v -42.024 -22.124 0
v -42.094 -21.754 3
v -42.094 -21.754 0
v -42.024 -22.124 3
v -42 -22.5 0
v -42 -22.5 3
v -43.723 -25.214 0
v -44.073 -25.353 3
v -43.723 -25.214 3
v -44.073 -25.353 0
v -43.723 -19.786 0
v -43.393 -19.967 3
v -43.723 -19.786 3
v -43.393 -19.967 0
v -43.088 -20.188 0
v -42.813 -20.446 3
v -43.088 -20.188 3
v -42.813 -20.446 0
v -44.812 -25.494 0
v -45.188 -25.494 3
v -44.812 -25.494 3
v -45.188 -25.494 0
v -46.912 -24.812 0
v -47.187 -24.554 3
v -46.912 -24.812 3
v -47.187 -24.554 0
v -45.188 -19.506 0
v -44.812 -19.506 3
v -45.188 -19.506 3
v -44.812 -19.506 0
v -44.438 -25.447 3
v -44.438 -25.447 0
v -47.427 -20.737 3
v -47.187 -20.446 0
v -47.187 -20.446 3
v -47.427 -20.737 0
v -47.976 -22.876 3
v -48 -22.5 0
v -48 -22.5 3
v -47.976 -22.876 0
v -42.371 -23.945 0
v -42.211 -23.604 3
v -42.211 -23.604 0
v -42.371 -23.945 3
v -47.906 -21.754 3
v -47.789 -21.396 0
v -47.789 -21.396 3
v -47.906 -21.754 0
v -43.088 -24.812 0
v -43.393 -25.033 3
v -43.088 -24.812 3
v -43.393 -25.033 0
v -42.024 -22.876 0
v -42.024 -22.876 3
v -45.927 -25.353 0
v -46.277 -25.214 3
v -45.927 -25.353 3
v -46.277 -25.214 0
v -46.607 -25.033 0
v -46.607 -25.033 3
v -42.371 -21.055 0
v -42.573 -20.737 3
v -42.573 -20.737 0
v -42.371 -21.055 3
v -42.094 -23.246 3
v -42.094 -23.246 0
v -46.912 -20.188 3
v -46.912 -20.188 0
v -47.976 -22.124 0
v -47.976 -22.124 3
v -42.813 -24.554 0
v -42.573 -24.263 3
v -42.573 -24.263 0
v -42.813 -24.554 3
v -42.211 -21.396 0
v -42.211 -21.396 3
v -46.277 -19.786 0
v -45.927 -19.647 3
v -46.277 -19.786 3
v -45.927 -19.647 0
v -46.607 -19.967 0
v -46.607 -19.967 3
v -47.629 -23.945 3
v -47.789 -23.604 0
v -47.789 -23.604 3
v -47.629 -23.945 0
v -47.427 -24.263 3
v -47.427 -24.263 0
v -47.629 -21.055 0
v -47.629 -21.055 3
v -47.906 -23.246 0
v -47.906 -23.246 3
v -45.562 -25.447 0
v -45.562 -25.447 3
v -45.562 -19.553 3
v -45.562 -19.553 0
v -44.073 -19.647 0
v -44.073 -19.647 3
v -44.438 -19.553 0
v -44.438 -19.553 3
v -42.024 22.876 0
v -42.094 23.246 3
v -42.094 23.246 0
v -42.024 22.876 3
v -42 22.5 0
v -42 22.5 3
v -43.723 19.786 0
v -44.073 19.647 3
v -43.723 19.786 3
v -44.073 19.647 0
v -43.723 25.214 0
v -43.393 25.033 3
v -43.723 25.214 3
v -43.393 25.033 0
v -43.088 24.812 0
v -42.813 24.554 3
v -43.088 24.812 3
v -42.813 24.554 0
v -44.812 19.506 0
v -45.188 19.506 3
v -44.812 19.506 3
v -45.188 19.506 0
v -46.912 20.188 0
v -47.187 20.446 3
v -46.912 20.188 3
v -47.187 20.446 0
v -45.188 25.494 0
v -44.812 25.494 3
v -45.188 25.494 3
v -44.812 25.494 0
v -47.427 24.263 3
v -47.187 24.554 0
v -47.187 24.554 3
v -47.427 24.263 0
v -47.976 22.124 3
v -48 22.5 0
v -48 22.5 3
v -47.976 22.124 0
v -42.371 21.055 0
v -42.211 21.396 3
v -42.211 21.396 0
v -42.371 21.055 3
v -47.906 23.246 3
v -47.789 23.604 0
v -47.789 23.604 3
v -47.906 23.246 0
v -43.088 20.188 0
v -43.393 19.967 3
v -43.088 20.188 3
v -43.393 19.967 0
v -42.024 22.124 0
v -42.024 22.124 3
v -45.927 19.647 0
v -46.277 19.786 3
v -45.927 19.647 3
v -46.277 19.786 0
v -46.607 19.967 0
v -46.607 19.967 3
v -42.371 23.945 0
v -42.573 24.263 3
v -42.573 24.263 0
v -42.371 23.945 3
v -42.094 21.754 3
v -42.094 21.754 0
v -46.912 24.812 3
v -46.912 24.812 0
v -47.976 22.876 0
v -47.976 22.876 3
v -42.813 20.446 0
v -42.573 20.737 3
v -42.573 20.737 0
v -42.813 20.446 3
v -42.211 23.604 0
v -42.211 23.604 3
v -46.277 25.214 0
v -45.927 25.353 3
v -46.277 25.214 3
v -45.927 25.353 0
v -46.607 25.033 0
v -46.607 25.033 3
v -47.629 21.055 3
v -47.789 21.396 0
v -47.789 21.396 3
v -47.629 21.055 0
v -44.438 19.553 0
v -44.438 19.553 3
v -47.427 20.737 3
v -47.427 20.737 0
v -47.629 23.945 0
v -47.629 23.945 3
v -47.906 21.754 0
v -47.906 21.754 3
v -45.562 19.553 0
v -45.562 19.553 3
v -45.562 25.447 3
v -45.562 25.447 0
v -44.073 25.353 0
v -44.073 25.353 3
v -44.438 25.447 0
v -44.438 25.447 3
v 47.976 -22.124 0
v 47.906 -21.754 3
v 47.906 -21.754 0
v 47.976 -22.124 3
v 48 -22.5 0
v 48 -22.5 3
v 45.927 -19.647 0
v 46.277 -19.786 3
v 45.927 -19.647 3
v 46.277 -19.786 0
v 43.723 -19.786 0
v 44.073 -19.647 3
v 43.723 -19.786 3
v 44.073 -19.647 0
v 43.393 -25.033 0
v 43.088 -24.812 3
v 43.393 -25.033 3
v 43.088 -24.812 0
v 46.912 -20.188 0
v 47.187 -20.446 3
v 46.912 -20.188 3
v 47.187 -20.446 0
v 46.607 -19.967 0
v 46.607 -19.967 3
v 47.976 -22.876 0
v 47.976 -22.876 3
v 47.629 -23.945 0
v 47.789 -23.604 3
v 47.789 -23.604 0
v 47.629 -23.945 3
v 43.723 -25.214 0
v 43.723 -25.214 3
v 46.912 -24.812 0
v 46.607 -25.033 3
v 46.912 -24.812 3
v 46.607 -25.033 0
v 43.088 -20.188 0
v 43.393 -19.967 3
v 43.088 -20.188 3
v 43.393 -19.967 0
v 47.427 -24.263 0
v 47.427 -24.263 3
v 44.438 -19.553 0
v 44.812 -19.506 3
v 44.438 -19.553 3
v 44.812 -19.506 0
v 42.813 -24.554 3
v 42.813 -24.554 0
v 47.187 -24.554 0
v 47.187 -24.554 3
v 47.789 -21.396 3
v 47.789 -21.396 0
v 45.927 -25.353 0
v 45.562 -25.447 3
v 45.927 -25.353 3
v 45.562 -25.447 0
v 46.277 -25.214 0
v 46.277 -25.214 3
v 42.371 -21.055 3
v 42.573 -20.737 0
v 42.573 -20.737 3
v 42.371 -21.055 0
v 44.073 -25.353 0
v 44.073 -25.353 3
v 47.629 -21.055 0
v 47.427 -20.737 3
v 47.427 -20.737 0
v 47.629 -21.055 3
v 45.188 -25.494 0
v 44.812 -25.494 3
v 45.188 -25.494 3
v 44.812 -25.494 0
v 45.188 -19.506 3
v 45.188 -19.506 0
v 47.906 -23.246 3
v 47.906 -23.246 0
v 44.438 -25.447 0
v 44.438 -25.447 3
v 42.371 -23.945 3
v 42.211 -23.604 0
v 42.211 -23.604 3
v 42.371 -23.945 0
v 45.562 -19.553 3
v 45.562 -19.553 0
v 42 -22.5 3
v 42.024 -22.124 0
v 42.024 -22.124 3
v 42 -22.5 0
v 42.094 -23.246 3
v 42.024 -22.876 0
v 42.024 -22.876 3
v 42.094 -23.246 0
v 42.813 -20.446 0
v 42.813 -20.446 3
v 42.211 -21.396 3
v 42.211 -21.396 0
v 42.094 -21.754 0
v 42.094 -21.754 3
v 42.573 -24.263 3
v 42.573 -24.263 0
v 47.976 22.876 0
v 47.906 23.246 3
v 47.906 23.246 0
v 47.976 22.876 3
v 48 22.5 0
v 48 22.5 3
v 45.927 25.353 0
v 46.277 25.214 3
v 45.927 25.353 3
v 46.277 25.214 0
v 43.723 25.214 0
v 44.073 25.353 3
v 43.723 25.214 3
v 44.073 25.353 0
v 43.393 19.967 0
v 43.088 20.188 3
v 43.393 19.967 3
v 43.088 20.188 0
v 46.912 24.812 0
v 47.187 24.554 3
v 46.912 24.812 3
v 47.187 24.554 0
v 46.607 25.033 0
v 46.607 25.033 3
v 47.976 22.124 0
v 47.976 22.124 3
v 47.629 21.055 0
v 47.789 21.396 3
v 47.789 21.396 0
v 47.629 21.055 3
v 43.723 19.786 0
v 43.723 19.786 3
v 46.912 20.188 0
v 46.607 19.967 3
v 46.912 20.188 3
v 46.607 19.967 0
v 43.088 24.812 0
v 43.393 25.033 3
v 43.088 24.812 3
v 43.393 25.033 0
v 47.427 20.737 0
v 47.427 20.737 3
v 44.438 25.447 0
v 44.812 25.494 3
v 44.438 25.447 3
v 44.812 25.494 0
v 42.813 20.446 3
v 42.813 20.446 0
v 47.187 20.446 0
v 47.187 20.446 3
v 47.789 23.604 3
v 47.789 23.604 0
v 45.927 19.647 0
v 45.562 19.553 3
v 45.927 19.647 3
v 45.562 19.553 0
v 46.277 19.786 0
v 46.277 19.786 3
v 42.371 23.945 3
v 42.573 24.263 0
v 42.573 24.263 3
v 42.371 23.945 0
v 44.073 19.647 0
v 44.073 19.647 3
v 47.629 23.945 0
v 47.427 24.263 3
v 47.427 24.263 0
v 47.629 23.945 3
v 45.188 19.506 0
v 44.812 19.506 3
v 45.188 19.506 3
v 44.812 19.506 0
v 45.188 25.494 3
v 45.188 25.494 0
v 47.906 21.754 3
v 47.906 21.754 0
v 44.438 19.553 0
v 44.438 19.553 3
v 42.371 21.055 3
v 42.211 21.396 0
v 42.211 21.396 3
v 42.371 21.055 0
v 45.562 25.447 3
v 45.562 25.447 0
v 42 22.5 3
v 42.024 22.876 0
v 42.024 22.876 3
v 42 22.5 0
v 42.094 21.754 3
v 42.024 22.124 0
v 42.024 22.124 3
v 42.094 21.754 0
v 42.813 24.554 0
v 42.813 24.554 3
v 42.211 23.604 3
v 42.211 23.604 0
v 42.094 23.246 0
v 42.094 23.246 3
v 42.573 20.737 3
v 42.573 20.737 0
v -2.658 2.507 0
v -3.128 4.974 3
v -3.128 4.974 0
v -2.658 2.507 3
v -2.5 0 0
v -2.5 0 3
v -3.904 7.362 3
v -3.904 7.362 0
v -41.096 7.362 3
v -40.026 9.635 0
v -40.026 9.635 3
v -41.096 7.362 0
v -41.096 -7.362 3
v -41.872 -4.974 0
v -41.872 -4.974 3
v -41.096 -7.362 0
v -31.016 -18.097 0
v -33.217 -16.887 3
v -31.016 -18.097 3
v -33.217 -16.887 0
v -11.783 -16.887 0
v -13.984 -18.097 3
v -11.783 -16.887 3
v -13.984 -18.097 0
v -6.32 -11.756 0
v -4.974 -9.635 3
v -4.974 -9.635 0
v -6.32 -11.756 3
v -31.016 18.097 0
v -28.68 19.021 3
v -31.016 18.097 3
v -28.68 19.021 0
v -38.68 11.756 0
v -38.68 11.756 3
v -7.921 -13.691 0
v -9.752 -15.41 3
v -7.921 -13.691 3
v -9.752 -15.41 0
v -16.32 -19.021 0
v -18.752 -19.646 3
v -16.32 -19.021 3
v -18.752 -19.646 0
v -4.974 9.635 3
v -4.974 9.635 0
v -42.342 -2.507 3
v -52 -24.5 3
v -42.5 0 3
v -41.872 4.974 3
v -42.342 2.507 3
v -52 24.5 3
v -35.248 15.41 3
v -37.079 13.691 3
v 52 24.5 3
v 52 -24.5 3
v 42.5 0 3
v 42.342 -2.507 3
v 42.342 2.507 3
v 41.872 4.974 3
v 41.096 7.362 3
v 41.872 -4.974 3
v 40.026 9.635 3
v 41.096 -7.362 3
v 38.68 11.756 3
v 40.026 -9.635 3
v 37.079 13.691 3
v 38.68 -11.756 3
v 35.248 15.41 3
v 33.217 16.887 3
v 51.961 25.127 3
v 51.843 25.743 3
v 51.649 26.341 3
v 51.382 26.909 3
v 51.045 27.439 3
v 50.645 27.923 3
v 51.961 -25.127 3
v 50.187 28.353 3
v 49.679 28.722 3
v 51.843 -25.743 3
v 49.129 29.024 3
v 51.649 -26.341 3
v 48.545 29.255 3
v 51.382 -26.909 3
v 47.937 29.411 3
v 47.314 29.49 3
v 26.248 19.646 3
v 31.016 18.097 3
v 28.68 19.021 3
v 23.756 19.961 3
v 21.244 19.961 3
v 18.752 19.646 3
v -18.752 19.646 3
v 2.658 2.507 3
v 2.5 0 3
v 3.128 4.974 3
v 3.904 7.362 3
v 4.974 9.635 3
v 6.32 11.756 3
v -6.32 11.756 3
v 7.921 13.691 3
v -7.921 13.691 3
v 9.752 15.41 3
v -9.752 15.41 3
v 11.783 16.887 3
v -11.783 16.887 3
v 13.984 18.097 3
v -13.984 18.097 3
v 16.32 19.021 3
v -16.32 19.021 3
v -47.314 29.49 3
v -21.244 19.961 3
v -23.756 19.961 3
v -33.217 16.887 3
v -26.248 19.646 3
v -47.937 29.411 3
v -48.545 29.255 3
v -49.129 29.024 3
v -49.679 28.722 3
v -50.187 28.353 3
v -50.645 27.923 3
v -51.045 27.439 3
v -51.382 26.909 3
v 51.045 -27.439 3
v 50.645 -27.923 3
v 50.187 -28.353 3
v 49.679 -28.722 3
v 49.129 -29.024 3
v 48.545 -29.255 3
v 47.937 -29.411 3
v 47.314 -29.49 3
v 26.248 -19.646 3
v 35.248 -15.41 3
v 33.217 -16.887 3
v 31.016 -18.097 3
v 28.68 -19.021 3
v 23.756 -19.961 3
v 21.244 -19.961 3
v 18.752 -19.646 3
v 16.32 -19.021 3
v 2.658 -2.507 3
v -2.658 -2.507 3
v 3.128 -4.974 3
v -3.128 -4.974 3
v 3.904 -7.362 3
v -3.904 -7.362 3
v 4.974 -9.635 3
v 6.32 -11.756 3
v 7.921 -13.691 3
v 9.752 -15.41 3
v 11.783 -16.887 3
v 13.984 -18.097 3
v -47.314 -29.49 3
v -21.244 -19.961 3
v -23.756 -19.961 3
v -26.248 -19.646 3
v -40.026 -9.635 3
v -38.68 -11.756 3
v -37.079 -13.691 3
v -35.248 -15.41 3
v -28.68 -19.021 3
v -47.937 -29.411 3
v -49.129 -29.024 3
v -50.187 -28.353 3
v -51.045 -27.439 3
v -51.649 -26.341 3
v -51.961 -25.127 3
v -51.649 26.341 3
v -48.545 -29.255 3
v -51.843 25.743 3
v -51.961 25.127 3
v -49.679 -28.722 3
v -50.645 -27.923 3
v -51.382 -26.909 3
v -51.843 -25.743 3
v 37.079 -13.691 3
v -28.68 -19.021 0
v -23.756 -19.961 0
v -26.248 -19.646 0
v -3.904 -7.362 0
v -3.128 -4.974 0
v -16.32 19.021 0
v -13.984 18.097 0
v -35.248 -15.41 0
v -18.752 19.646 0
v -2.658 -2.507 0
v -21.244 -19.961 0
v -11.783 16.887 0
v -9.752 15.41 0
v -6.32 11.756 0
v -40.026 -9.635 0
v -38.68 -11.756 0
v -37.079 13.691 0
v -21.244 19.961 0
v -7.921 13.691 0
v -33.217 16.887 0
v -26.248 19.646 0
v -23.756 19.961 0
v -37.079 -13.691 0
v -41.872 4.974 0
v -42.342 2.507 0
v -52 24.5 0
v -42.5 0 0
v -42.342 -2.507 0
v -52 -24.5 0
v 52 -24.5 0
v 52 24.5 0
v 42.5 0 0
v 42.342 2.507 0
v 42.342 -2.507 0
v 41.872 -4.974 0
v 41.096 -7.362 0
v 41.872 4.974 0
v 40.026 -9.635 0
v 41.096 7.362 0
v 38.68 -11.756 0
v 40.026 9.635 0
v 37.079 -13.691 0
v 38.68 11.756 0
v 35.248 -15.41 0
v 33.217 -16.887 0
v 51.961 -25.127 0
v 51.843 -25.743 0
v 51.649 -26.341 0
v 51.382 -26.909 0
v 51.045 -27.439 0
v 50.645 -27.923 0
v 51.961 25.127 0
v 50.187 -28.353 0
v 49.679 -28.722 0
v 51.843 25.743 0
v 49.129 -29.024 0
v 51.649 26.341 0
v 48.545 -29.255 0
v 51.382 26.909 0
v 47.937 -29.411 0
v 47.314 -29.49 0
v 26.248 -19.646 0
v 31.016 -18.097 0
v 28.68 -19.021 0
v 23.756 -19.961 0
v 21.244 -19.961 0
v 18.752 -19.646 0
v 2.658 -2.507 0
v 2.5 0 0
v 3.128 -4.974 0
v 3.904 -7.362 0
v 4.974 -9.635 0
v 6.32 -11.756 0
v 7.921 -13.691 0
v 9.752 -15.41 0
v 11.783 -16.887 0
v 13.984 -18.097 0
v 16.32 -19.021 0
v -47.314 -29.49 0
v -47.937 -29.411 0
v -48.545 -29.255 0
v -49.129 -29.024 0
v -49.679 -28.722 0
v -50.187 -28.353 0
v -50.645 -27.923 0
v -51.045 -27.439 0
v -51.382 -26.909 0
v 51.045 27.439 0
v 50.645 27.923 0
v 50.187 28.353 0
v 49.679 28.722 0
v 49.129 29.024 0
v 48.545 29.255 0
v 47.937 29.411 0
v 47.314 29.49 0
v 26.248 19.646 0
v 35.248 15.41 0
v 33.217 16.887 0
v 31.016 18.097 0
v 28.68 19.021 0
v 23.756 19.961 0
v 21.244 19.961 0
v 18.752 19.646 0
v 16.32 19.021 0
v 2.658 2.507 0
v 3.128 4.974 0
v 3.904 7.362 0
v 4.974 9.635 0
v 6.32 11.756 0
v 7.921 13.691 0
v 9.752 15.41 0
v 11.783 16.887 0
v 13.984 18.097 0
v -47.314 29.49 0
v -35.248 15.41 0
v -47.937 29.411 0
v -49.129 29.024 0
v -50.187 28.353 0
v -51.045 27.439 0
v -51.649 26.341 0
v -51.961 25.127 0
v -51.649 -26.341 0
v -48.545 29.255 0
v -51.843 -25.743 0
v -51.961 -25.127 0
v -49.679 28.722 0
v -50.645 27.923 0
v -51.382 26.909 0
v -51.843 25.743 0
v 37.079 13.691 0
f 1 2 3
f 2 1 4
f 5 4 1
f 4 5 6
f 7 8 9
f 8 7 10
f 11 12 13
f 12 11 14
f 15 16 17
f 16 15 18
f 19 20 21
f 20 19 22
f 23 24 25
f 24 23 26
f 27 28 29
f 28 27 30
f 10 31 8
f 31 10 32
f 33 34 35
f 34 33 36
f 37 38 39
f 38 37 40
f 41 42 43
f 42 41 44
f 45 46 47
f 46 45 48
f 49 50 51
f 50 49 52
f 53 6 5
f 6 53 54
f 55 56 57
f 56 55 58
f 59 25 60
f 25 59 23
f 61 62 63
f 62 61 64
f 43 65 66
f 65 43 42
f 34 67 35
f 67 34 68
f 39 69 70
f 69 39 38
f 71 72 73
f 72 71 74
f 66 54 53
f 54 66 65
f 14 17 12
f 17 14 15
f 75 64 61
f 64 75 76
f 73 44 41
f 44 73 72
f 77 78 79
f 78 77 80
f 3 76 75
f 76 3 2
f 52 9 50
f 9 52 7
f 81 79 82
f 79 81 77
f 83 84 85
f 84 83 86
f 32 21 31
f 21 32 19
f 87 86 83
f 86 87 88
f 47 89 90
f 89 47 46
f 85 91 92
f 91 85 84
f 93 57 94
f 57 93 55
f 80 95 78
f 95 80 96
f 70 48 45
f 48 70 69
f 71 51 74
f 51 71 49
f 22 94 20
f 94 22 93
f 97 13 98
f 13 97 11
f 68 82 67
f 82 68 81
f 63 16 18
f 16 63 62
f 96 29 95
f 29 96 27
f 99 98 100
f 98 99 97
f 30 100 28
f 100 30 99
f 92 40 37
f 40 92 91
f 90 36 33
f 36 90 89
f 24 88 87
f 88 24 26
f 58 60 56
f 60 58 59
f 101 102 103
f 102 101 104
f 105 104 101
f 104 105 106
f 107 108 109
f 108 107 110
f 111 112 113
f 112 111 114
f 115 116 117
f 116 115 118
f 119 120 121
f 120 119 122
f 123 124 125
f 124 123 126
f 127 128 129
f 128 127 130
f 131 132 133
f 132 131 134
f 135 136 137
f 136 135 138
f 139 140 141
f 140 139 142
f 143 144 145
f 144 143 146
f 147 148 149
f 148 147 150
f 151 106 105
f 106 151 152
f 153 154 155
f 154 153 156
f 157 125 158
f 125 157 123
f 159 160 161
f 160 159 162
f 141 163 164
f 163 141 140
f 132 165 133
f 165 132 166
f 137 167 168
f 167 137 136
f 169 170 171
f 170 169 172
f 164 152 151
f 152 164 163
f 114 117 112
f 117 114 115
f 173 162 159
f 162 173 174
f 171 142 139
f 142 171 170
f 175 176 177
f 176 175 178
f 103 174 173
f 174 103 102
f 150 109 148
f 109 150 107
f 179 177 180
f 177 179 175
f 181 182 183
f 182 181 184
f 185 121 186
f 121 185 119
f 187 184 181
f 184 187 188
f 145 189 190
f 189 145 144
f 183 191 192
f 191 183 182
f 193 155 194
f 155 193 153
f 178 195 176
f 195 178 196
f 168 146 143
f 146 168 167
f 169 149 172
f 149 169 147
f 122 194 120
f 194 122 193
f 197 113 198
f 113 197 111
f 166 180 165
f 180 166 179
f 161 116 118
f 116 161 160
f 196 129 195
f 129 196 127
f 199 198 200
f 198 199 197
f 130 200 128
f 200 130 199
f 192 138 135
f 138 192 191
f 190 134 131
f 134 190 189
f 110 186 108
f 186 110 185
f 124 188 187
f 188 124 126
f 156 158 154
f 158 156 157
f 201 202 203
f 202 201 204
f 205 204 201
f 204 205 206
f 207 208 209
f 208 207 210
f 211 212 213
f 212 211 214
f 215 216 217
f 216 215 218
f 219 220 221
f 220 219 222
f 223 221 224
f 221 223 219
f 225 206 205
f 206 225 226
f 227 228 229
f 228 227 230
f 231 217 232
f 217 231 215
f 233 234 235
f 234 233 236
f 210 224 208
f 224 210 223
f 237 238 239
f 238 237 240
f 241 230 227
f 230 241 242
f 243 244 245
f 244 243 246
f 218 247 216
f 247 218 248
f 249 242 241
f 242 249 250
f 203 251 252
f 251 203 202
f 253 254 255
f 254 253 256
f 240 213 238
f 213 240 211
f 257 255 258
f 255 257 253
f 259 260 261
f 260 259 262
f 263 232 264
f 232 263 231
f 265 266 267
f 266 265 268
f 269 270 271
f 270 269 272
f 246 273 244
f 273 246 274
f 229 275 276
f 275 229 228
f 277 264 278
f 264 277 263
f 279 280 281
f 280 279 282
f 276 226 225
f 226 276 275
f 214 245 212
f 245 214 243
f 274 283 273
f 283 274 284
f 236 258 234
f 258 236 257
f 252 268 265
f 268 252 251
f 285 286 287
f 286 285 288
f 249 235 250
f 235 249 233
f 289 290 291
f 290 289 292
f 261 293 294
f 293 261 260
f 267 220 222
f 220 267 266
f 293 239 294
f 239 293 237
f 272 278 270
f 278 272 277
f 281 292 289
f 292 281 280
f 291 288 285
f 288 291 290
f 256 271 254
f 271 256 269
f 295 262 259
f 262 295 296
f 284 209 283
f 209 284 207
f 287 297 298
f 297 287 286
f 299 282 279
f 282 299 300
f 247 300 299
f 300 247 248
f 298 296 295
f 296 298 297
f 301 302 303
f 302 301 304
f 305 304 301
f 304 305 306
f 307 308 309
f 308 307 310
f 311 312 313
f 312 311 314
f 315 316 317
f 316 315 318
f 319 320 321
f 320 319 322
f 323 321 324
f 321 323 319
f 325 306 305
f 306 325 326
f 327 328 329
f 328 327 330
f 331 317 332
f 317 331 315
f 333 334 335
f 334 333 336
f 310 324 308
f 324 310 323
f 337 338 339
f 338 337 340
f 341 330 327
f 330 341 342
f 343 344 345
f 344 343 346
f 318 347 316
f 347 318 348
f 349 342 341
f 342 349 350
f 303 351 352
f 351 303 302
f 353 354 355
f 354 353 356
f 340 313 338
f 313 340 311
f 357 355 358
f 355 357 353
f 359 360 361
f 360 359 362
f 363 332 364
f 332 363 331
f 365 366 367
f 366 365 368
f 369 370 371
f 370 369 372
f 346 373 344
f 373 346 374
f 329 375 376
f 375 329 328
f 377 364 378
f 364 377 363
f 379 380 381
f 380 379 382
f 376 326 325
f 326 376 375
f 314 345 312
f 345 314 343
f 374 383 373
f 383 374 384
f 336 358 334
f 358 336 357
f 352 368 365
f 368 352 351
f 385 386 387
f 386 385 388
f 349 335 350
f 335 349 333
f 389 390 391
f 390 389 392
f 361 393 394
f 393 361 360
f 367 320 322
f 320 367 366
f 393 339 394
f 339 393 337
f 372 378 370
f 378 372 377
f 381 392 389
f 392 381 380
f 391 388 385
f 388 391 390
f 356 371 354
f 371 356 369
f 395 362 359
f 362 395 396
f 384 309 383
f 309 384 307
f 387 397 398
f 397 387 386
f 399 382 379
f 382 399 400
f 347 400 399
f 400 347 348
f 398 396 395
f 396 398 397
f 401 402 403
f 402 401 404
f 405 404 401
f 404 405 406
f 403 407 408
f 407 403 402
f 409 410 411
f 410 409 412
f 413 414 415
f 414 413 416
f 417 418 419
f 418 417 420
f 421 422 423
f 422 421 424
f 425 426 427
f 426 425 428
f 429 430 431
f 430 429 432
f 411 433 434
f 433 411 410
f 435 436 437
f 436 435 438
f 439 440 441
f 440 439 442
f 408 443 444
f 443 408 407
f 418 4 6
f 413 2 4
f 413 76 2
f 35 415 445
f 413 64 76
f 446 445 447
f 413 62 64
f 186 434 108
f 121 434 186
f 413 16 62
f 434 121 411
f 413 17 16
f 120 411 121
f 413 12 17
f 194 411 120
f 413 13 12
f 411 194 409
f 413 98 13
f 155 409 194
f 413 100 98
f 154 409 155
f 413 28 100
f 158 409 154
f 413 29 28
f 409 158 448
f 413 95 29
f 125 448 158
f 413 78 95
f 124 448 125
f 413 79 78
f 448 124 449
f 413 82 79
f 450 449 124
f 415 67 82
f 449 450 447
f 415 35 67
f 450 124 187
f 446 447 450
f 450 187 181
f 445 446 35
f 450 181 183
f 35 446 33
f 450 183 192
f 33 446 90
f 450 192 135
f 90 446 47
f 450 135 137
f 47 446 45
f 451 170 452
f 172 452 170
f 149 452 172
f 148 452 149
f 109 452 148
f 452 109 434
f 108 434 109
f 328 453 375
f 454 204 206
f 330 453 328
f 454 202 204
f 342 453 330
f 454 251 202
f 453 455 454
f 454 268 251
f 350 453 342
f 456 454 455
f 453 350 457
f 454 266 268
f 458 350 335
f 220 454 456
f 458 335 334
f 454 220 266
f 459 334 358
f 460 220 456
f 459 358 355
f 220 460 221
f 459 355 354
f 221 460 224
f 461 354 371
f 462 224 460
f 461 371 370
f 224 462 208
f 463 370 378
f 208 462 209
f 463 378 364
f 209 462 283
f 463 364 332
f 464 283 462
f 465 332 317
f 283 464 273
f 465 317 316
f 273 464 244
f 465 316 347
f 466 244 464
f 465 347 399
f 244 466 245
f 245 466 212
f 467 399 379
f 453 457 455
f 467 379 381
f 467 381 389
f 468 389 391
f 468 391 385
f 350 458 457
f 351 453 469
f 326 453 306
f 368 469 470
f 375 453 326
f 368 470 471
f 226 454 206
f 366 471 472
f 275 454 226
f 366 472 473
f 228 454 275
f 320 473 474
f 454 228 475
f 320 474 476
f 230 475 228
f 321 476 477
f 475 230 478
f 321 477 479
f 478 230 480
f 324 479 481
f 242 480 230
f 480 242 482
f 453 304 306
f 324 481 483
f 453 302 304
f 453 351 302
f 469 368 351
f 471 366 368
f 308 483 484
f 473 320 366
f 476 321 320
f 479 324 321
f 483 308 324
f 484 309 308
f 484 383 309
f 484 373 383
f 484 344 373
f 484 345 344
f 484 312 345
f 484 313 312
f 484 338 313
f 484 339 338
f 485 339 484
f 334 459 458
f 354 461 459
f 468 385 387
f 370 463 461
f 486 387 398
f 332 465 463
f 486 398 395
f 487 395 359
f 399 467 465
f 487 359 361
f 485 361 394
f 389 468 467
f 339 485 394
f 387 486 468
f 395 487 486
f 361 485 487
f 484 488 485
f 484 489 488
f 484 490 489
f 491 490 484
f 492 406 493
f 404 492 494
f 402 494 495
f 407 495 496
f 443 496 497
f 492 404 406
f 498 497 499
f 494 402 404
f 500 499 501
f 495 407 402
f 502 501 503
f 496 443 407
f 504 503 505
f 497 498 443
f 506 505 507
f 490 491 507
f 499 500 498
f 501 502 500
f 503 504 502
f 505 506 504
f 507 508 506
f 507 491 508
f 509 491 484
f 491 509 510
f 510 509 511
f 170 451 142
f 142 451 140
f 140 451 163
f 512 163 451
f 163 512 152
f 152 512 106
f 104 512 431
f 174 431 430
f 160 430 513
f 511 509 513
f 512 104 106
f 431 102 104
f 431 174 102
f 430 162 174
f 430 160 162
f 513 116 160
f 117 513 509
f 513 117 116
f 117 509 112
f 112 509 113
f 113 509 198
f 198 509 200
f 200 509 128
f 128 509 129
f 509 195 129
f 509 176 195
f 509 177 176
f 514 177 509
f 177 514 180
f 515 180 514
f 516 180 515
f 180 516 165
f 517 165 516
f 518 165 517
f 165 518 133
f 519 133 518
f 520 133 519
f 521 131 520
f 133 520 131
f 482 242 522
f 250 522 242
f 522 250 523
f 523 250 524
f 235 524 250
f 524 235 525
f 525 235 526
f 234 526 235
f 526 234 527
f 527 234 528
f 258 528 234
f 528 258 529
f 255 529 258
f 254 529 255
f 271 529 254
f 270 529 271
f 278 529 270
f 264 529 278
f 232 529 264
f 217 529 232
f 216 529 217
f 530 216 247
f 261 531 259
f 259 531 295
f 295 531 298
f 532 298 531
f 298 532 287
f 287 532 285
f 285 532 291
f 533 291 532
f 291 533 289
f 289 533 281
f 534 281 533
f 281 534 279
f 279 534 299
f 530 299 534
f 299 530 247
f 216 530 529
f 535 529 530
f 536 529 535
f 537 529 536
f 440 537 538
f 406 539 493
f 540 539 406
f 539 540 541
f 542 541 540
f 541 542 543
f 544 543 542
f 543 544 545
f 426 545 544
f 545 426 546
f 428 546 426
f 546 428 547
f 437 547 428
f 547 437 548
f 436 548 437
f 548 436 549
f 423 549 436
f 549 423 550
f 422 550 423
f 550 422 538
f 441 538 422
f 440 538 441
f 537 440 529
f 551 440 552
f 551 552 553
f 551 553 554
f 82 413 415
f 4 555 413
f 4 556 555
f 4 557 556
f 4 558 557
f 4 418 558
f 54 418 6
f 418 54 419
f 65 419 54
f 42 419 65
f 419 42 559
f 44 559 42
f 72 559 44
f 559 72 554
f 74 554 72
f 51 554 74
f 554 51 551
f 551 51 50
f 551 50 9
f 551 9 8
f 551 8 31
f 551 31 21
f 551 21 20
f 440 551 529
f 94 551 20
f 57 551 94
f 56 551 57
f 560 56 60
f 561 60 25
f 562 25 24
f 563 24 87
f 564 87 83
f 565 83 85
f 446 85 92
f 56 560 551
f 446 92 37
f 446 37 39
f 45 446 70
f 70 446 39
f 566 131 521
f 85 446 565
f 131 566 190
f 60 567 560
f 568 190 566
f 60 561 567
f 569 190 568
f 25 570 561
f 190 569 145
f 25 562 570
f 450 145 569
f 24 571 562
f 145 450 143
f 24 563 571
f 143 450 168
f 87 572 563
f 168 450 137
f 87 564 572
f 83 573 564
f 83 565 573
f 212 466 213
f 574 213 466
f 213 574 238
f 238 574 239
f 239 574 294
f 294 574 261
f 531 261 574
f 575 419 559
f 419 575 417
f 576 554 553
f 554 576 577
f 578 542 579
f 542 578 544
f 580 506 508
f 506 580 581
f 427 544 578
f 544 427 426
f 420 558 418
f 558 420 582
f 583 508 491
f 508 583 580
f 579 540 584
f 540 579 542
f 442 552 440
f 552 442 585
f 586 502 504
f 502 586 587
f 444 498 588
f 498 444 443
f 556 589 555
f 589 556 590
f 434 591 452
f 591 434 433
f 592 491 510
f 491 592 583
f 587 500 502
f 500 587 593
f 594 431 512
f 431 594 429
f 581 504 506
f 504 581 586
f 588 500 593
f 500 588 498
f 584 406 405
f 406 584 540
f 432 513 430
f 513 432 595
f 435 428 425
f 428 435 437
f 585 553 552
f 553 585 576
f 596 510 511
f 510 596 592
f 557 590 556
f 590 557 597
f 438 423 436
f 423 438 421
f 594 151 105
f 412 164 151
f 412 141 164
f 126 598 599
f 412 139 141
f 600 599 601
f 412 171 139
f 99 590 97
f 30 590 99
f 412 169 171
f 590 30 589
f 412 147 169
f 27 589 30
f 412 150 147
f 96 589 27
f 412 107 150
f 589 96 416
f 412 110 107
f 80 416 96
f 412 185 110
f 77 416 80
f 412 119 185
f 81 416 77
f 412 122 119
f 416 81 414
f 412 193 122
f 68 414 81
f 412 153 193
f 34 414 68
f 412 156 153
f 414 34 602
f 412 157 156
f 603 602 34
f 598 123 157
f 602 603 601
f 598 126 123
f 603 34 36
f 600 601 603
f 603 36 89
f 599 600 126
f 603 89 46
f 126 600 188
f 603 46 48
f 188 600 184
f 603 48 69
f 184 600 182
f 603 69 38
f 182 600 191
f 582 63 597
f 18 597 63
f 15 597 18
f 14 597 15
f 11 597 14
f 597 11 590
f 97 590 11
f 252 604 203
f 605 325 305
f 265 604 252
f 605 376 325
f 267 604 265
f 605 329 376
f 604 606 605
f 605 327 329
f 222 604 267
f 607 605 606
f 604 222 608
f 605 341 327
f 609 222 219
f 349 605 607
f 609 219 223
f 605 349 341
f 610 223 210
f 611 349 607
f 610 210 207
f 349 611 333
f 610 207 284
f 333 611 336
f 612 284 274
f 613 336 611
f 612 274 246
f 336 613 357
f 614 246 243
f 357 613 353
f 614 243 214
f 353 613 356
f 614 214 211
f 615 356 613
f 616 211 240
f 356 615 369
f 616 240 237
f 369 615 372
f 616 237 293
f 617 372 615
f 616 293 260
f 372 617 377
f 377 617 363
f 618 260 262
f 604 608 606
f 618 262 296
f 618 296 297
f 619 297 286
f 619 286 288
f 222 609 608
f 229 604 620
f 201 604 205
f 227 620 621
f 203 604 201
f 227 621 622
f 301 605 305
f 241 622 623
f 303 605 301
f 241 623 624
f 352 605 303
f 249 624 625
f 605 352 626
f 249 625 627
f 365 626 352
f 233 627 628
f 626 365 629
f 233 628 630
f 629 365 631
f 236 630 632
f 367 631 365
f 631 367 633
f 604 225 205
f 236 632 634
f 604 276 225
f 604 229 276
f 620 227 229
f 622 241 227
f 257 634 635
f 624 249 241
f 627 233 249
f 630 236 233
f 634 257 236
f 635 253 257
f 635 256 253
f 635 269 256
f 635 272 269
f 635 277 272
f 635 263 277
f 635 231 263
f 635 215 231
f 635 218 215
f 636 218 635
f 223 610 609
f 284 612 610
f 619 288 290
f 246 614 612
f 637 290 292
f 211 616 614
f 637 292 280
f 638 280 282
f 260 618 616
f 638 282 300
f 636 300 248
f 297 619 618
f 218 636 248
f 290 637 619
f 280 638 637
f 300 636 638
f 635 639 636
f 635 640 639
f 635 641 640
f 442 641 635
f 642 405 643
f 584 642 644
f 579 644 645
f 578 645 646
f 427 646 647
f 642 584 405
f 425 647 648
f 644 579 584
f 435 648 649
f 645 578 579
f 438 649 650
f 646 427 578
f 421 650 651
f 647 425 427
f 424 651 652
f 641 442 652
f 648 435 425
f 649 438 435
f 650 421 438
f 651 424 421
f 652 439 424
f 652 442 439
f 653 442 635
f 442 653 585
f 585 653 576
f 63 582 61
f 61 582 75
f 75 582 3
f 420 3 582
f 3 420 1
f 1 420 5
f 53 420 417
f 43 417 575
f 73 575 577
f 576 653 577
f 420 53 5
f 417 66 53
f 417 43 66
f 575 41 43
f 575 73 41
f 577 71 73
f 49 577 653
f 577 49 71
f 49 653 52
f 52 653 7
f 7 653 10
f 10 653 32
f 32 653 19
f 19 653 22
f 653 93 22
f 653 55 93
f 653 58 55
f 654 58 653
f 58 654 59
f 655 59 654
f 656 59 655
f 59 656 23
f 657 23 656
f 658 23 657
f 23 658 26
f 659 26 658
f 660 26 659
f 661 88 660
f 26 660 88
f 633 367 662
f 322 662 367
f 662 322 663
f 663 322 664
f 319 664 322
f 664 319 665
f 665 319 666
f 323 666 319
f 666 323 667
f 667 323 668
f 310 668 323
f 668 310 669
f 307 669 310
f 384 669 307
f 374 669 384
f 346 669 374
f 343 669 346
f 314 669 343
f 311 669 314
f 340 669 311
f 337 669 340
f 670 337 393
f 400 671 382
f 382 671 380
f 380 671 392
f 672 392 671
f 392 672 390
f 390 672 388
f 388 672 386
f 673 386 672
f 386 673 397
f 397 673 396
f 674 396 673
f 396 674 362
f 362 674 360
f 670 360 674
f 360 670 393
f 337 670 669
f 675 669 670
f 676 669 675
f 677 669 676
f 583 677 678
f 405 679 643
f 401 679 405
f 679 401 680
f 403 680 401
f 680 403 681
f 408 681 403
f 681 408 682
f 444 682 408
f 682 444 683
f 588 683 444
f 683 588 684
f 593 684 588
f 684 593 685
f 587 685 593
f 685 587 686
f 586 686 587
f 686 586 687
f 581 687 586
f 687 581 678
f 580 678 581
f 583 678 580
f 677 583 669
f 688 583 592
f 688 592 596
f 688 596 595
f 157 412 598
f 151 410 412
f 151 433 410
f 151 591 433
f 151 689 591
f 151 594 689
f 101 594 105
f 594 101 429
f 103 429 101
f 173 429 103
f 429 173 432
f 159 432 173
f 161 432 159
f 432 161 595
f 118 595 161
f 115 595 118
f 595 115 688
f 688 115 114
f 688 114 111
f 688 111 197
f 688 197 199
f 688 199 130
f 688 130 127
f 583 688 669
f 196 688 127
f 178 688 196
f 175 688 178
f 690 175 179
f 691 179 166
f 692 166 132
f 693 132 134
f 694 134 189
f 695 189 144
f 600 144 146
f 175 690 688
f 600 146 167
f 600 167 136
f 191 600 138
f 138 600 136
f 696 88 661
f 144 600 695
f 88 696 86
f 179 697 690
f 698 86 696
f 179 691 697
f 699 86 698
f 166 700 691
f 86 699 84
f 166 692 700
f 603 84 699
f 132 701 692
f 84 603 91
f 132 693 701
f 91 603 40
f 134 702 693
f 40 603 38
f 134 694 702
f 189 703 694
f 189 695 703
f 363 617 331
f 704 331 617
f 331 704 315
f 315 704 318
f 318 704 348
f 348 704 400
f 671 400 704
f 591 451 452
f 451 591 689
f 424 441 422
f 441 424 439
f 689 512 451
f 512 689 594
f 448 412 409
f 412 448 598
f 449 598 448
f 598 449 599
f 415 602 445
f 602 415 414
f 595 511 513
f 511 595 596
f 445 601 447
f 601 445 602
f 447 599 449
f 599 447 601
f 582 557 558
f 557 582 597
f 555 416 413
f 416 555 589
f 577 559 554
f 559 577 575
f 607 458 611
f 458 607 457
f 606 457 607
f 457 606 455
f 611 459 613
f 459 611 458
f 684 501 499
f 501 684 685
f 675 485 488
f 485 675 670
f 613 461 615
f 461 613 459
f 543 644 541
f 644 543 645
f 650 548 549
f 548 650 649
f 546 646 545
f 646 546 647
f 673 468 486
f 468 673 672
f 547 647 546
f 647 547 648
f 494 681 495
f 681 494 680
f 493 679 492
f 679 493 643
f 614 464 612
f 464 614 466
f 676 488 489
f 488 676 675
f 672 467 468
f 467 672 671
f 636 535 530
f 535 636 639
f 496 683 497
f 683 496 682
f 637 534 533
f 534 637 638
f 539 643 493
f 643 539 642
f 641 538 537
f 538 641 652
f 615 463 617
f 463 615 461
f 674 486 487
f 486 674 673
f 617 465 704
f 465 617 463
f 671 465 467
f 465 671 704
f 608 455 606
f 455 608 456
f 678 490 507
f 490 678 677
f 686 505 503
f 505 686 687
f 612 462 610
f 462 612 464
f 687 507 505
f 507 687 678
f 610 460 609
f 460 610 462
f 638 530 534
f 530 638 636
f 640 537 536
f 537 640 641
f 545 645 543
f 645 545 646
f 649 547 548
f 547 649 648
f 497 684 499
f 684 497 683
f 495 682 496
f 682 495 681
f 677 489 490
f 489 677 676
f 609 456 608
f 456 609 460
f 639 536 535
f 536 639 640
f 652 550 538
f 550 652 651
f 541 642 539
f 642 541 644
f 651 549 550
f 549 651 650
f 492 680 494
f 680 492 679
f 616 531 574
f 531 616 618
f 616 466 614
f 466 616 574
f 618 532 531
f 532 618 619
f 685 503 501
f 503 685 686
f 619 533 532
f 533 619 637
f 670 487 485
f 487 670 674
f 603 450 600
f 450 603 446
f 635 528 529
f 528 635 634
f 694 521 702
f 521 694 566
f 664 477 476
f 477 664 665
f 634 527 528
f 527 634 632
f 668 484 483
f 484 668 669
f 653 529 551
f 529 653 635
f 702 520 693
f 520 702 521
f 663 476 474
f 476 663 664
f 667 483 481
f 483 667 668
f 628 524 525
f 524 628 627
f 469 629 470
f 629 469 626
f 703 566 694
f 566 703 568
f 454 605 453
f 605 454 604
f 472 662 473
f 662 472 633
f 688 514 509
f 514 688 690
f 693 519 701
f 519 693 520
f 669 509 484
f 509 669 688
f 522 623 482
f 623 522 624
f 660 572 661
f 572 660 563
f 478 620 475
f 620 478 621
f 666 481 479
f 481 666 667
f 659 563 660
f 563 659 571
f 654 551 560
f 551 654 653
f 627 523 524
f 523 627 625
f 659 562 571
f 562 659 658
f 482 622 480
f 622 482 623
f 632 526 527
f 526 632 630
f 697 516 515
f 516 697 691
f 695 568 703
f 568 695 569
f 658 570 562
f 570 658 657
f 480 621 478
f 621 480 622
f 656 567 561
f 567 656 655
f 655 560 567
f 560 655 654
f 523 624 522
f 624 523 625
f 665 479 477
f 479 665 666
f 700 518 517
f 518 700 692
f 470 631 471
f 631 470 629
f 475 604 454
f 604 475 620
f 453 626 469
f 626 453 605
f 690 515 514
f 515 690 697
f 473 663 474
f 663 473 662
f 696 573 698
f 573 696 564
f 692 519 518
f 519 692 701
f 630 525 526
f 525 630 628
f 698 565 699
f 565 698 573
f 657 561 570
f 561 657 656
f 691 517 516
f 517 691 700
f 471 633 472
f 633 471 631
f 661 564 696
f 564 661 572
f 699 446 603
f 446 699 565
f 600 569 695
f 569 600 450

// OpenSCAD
$fn = 50;


difference() {
	union() {
		hull() {
			translate(v = [-47.0000000000, 24.5000000000, 0]) {
				cylinder(h = 3, r = 5);
			}
			translate(v = [47.0000000000, 24.5000000000, 0]) {
				cylinder(h = 3, r = 5);
			}
			translate(v = [-47.0000000000, -24.5000000000, 0]) {
				cylinder(h = 3, r = 5);
			}
			translate(v = [47.0000000000, -24.5000000000, 0]) {
				cylinder(h = 3, r = 5);
			}
		}
	}
	union() {
		#translate(v = [-45.0000000000, -22.5000000000, -100.0000000000]) {
			cylinder(h = 200, r = 3.0000000000);
		}
		#translate(v = [-45.0000000000, 22.5000000000, -100.0000000000]) {
			cylinder(h = 200, r = 3.0000000000);
		}
		#translate(v = [45.0000000000, -22.5000000000, -100.0000000000]) {
			cylinder(h = 200, r = 3.0000000000);
		}
		#translate(v = [45.0000000000, 22.5000000000, -100.0000000000]) {
			cylinder(h = 200, r = 3.0000000000);
		}
		#translate(v = [-22.5000000000, 0, 0]) {
			cylinder(h = 3, r = 20.0000000000);
		}
		#translate(v = [22.5000000000, 0, 0]) {
			cylinder(h = 3, r = 20.0000000000);
		}
	}
}
